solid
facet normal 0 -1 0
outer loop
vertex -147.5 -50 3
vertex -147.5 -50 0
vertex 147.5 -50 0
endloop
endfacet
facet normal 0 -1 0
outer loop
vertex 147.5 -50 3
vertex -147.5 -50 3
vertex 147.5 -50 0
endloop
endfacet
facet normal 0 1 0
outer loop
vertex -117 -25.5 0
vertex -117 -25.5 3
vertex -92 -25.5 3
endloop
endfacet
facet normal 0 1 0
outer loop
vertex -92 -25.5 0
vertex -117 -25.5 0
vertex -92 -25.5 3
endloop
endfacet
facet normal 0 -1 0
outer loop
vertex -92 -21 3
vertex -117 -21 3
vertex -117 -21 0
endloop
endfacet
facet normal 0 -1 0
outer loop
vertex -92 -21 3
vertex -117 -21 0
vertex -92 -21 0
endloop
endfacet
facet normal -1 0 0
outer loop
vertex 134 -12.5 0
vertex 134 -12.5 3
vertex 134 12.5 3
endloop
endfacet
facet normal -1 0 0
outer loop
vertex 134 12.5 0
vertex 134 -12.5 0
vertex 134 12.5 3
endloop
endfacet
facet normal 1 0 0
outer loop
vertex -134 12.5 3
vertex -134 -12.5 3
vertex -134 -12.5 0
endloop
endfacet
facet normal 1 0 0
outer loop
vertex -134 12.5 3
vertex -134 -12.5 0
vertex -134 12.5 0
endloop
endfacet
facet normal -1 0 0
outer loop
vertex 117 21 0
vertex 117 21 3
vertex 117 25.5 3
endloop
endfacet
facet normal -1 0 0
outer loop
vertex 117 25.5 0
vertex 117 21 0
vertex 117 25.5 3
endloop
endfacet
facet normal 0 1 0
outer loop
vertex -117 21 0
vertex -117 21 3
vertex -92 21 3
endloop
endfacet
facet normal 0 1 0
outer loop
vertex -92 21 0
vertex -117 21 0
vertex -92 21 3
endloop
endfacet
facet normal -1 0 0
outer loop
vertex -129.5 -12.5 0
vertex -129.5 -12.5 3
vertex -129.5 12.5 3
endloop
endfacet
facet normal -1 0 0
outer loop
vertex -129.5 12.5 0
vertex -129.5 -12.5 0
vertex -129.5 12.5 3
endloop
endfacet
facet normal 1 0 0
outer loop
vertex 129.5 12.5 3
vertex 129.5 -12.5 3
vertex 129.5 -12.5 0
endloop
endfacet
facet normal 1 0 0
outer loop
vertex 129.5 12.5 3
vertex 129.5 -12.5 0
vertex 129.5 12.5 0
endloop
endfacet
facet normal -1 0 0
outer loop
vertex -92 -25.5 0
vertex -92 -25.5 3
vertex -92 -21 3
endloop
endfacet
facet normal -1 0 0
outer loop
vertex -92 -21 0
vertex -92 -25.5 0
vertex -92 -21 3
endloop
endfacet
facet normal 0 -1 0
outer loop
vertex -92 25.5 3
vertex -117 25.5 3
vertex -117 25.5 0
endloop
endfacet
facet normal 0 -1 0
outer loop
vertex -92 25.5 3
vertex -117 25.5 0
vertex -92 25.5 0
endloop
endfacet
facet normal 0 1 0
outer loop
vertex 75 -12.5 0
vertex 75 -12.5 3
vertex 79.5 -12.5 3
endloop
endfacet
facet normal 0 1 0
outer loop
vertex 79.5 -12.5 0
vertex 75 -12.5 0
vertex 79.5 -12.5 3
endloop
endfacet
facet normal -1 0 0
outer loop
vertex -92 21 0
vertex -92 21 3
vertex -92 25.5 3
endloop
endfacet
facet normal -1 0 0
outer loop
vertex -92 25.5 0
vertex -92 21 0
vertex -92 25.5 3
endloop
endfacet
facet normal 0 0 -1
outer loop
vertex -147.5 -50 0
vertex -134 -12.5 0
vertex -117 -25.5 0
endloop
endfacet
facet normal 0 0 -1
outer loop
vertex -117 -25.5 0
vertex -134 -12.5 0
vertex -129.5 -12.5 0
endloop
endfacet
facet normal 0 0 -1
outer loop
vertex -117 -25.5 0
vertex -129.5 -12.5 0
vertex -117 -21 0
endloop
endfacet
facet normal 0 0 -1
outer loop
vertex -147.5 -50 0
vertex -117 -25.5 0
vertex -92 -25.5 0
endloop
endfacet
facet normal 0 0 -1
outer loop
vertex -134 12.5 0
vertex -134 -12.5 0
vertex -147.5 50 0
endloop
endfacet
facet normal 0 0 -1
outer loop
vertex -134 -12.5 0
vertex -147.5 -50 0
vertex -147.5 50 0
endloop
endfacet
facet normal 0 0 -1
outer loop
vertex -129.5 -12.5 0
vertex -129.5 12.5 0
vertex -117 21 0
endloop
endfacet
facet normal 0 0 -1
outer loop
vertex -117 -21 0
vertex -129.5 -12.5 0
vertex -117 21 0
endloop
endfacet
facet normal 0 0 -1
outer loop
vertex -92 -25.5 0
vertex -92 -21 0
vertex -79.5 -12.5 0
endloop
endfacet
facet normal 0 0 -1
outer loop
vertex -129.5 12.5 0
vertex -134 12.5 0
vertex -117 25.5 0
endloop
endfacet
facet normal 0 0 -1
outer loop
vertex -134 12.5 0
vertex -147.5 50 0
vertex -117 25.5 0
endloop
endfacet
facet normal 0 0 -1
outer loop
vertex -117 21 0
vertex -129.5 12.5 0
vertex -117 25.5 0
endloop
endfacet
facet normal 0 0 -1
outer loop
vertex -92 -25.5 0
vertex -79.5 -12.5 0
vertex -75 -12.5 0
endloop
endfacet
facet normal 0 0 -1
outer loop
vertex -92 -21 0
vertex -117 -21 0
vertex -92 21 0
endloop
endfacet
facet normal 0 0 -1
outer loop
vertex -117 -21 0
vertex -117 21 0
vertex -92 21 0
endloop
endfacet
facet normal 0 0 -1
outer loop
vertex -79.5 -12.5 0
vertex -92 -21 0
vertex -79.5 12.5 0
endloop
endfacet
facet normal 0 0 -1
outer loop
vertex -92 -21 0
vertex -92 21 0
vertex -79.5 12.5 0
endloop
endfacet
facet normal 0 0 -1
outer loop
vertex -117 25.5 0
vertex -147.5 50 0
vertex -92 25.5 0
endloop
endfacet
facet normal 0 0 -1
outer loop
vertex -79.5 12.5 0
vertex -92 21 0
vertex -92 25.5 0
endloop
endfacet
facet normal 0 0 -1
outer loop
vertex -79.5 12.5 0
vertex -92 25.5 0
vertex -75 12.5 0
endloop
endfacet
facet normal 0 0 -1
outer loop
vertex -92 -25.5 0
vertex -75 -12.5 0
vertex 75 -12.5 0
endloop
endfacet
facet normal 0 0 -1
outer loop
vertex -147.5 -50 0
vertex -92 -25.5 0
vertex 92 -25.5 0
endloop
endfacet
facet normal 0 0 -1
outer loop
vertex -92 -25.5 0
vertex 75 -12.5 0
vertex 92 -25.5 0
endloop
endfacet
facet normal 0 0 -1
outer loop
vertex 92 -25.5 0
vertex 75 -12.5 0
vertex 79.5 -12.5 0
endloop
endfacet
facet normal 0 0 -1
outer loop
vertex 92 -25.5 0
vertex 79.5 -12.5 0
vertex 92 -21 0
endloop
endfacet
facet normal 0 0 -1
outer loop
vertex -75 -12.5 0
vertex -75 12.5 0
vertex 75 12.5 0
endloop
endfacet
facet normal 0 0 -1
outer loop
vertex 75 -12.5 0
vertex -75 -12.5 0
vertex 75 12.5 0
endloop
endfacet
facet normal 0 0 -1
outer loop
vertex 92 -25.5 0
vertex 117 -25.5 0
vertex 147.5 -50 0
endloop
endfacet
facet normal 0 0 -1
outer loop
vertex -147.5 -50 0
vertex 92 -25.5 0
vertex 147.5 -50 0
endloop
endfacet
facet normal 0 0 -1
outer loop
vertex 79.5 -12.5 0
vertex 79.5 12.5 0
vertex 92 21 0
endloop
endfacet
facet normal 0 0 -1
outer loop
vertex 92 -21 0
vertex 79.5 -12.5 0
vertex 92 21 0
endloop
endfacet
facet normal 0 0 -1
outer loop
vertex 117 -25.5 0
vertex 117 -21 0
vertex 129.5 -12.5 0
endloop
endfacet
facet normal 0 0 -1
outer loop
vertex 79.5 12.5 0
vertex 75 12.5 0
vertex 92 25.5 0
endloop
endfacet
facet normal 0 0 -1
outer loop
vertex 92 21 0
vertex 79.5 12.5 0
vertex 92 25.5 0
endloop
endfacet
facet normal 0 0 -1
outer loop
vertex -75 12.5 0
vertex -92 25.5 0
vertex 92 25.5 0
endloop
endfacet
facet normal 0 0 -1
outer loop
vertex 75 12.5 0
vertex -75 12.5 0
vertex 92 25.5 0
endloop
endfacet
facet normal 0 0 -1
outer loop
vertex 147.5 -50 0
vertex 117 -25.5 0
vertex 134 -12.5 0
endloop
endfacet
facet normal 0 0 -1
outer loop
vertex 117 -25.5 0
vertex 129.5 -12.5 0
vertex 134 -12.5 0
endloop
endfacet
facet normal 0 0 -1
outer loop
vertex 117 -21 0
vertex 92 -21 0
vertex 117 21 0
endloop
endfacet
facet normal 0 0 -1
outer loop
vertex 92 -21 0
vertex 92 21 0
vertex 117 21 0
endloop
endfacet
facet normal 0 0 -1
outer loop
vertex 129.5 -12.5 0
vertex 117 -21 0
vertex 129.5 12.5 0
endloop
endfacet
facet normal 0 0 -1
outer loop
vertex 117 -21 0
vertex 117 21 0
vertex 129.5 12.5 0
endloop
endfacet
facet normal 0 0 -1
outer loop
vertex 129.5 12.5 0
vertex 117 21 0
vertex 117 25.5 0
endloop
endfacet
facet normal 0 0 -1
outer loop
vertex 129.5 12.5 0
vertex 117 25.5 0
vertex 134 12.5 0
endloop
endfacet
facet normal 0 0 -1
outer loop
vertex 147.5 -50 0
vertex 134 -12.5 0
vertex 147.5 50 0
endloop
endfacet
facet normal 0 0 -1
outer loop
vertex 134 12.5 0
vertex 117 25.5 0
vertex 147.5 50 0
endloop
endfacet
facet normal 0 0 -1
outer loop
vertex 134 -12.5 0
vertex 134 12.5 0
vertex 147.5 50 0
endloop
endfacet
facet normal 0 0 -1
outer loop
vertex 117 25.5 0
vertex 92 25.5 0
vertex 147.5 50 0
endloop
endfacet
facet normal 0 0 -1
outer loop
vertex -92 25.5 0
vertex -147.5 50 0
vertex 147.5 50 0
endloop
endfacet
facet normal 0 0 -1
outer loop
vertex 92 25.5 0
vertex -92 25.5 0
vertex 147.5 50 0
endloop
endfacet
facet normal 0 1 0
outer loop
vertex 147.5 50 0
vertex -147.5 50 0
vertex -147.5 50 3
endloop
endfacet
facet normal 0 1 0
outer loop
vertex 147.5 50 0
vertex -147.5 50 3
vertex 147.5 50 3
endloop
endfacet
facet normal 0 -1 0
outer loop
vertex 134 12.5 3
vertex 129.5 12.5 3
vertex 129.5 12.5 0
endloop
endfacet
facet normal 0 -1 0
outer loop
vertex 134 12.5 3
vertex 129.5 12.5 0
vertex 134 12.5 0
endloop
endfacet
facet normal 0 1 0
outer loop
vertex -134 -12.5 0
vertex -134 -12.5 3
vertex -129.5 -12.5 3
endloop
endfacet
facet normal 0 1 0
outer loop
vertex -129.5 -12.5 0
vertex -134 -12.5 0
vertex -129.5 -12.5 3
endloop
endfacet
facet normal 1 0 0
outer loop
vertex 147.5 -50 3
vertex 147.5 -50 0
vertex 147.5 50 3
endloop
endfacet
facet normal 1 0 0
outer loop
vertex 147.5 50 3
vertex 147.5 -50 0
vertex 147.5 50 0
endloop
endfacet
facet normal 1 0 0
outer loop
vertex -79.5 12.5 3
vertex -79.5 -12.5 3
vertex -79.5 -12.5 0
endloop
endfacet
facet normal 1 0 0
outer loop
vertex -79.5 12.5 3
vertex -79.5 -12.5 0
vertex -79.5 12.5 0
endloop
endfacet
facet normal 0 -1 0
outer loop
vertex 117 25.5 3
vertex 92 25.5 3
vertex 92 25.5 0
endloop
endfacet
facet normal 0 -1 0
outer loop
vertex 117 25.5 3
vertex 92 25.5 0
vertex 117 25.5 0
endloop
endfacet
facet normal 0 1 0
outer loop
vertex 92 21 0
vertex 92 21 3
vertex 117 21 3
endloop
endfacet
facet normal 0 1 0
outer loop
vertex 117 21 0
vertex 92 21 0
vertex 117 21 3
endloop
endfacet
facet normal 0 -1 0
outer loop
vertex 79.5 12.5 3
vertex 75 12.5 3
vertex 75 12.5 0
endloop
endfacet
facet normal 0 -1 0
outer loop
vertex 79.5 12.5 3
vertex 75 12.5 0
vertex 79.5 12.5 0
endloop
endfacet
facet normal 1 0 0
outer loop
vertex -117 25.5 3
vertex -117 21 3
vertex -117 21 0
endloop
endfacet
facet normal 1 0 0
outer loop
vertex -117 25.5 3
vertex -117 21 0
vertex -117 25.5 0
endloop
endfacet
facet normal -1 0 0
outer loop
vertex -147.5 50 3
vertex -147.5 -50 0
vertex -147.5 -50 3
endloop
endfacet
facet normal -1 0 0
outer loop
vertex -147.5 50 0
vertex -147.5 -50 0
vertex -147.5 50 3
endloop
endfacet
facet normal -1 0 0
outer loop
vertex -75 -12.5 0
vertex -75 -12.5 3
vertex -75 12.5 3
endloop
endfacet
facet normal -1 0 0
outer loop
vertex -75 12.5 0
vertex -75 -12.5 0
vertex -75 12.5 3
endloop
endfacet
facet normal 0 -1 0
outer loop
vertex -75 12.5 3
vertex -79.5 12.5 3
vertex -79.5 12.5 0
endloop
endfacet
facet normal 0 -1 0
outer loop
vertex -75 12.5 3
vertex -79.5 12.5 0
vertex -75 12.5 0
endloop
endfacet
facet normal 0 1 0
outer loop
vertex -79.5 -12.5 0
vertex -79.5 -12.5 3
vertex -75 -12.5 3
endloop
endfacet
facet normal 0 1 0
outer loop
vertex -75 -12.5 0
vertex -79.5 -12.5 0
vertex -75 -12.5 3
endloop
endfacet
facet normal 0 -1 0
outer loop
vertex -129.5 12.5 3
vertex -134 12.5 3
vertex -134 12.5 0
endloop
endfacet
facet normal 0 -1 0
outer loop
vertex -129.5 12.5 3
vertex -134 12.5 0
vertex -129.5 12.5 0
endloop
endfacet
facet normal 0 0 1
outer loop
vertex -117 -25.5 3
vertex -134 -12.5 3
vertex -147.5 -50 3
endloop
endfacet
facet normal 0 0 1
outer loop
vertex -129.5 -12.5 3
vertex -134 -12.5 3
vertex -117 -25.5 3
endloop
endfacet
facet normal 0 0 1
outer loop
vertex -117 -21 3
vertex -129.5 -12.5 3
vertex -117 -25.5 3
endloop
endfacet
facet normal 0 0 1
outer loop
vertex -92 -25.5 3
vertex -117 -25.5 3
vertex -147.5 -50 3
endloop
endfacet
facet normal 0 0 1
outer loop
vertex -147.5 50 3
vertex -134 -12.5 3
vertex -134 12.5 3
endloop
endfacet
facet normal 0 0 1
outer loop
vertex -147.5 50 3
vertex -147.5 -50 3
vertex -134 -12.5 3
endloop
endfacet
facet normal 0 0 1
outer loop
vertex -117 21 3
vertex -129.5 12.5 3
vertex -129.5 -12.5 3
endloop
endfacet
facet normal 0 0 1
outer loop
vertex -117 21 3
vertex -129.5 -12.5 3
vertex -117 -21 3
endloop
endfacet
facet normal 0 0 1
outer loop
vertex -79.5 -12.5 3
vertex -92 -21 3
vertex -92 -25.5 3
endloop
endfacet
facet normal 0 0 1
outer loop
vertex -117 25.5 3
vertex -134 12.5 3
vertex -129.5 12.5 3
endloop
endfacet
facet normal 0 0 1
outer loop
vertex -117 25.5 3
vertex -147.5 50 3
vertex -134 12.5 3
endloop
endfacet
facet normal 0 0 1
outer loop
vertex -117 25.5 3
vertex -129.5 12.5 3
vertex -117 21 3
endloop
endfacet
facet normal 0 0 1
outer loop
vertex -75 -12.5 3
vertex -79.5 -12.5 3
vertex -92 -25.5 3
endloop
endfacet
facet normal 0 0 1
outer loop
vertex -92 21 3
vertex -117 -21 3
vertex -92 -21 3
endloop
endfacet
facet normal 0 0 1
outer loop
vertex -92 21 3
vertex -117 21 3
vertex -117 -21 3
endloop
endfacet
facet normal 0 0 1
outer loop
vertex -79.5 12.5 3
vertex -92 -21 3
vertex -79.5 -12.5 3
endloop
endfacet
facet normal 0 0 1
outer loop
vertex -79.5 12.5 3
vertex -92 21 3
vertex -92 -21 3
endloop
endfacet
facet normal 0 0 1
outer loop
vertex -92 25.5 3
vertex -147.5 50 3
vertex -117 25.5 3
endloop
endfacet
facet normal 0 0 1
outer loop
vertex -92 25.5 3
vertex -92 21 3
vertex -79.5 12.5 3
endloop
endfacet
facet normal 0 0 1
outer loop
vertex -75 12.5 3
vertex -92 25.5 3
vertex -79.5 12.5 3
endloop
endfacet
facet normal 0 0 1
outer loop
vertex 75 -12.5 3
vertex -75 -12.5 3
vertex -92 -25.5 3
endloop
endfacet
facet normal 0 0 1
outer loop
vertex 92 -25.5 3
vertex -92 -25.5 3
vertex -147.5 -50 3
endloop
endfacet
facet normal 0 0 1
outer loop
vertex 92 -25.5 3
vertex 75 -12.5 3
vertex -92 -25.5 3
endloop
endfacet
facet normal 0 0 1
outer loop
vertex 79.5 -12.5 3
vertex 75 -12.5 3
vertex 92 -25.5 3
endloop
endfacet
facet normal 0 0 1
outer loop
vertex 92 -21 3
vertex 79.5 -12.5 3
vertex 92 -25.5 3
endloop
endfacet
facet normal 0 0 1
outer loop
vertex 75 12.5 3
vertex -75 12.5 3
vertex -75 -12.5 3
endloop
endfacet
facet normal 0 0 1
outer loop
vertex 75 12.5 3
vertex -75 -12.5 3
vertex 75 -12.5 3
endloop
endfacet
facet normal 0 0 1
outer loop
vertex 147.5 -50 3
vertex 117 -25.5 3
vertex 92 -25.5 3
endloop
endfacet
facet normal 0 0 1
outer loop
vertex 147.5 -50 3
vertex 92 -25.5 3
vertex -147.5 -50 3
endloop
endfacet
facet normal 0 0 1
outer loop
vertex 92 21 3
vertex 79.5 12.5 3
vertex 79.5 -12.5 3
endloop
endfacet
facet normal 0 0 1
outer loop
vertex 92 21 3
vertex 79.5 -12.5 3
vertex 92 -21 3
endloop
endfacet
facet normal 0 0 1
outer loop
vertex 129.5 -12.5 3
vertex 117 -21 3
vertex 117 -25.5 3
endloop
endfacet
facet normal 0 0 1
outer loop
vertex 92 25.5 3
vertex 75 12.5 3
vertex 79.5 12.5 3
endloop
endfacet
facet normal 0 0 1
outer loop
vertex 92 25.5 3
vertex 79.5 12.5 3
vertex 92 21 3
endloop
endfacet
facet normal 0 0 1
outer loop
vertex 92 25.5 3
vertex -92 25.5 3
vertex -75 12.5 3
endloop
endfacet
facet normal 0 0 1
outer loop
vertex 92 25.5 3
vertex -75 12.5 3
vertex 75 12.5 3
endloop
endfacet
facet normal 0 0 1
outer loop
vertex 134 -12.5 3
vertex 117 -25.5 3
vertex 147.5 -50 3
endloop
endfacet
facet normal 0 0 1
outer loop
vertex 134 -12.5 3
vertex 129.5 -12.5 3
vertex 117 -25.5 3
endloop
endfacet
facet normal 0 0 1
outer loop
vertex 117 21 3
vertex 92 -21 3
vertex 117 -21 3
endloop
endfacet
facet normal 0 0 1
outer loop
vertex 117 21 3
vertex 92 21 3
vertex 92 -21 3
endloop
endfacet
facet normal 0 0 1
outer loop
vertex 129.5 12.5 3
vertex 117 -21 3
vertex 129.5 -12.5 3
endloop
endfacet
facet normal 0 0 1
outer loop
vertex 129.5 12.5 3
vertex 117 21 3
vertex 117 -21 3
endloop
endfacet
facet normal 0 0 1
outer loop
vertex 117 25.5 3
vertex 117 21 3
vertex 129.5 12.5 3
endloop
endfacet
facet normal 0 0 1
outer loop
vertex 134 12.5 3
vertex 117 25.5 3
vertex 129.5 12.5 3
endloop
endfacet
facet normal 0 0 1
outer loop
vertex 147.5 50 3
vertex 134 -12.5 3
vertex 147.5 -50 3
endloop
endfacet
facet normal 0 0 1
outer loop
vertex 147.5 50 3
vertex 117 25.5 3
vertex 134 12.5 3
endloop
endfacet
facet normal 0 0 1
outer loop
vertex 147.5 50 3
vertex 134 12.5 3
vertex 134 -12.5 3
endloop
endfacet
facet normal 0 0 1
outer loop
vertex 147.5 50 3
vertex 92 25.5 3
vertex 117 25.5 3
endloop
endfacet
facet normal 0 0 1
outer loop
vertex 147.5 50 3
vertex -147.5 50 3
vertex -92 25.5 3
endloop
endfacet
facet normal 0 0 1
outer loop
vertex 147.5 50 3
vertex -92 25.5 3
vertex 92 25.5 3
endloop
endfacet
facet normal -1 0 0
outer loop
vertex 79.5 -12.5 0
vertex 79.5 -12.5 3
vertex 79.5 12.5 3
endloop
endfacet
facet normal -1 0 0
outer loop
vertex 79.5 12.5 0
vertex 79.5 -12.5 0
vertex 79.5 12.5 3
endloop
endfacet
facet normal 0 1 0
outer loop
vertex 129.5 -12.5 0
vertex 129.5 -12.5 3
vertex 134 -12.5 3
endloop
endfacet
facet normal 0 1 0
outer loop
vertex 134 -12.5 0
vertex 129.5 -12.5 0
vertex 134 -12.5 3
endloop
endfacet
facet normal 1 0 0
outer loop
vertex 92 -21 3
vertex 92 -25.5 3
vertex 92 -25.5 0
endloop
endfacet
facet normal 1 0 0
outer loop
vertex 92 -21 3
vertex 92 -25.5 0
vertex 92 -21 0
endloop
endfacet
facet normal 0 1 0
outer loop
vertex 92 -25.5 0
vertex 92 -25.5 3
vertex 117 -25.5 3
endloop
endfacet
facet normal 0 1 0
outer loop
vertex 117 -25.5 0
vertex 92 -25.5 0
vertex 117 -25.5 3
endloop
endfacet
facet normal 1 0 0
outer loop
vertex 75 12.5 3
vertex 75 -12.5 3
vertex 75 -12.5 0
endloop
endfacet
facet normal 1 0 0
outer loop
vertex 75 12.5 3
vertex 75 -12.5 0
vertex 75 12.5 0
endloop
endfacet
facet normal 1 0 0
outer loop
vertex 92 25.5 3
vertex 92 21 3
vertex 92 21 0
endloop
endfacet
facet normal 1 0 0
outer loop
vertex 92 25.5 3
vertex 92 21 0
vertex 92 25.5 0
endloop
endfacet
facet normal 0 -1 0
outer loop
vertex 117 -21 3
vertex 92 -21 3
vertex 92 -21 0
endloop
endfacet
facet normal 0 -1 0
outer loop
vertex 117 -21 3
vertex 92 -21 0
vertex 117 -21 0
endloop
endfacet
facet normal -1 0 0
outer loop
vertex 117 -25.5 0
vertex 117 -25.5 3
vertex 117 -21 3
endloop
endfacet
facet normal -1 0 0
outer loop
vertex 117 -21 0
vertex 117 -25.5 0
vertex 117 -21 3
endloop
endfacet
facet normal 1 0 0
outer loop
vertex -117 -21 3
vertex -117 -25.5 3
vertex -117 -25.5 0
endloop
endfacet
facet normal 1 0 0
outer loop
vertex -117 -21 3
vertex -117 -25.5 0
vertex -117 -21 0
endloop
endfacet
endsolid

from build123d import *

# Parameters (mm, degrees)
ESBO_O1_W                = 295
ESBO_O1_H                = 100
RESSALTO_EXTRUS_O1_DEPTH = 3
ESBO_O2_W                = 4.5
ESBO_O2_H                = 25
ESBO_O2_W_2              = 25
ESBO_O2_H_2              = 4.5
CORTE_EXTRUS_O1_DEPTH    = 156.773072127


with BuildPart() as part:
    # Esboço1 → Ressalto-extrusão1 (new body)
    with BuildSketch(Plane.XY):
        Rectangle(ESBO_O1_W, ESBO_O1_H)
    extrude(amount=RESSALTO_EXTRUS_O1_DEPTH)

    # Esboço2 → Corte-extrusão1 (cut, through all)
    with BuildSketch(Plane.XY.offset(3)):
        with Locations((131.75, 0)):
            Rectangle(ESBO_O2_W, ESBO_O2_H)
        with Locations((-77.25, 0)):
            Rectangle(ESBO_O2_W, ESBO_O2_H)
        with Locations((-131.75, 0)):
            Rectangle(ESBO_O2_W, ESBO_O2_H)
        with Locations((-104.5, 23.25)):
            Rectangle(ESBO_O2_W_2, ESBO_O2_H_2)
        with Locations((-104.5, -23.25)):
            Rectangle(ESBO_O2_W_2, ESBO_O2_H_2)
        with Locations((77.25, 0)):
            Rectangle(ESBO_O2_W, ESBO_O2_H)
        with Locations((104.5, -23.25)):
            Rectangle(ESBO_O2_W_2, ESBO_O2_H_2)
        with Locations((104.5, 23.25)):
            Rectangle(ESBO_O2_W_2, ESBO_O2_H_2)
    extrude(amount=-CORTE_EXTRUS_O1_DEPTH, mode=Mode.SUBTRACT)


solid = part.part
